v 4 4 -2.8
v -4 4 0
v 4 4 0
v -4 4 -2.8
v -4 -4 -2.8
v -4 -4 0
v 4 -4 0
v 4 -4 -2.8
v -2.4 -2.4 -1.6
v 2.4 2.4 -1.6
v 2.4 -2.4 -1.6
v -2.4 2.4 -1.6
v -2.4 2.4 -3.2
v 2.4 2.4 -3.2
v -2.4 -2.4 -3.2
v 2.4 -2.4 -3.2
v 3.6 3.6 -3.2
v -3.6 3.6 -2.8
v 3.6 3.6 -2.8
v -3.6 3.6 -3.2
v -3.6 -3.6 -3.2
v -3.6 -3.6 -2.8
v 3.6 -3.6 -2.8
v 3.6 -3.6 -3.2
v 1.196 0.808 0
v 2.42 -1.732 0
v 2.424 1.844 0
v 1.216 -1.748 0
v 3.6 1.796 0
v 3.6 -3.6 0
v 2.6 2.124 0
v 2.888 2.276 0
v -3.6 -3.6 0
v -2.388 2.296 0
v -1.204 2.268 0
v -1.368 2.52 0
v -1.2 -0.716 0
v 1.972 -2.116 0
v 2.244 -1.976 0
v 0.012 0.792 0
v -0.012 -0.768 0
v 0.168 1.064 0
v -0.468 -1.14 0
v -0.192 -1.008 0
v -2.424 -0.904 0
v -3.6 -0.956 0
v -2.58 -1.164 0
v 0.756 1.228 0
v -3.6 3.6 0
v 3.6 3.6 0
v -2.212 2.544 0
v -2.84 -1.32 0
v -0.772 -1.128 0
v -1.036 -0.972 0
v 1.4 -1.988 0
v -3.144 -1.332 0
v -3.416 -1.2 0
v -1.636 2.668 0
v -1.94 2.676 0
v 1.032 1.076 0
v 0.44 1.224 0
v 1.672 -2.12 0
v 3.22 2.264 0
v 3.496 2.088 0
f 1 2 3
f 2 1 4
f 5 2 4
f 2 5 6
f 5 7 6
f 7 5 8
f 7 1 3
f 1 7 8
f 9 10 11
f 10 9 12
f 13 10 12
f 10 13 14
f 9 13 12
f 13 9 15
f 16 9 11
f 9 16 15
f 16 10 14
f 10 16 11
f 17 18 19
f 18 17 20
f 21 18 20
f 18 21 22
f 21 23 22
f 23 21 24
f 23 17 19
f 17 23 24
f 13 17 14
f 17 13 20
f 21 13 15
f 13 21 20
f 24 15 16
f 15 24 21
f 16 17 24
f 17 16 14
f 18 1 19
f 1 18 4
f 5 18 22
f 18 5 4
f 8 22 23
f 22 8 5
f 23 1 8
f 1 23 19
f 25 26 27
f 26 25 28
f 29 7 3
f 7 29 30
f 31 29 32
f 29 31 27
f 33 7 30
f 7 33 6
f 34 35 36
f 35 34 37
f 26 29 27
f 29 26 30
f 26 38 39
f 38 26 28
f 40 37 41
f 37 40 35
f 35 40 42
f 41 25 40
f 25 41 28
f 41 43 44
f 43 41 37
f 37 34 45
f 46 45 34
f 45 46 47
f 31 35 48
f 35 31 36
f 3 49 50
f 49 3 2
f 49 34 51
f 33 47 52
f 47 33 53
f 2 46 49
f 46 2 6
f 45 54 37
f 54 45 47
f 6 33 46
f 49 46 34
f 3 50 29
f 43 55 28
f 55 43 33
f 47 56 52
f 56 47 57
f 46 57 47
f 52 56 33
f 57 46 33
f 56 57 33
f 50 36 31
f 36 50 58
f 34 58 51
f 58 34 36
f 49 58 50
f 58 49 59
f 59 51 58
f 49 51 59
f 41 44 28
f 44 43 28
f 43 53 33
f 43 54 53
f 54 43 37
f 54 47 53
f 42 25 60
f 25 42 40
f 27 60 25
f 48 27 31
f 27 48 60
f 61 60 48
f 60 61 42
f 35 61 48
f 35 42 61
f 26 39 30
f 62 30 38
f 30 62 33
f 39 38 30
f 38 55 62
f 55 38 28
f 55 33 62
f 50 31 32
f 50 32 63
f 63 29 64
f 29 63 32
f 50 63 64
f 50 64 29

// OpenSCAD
// file: ../p/box5.scad
use <../lib.scad>
function ldraw_lib__box5() = [
// 0 Box with 5 Faces and All Edges
// 0 Name: box5.dat
// 0 Author: James Jessiman
// 0 !LDRAW_ORG Primitive UPDATE 2012-01
// 0 !LICENSE Licensed under CC BY 4.0 : see CAreadme.txt
// 
// 0 BFC CERTIFY CCW
  [0,"BFC","CERTIFY"],
  [0,"BFC","CCW"],
// 
// 0 !HISTORY 2002-04-03 [sbliss] Modified for BFC compliance
// 0 !HISTORY 2002-04-25 [PTadmin] Official Update 2002-02
// 0 !HISTORY 2007-06-24 [PTadmin] Header formatted for Contributor Agreement
// 0 !HISTORY 2008-07-01 [PTadmin] Official Update 2008-01
// 0 !HISTORY 2012-02-16 [Philo] Changed to CCW
// 0 !HISTORY 2012-03-30 [PTadmin] Official Update 2012-01
// 
// 
// 2 24 1 1 1 -1 1 1
  [2,24,1,1,1,-1,1,1],
// 2 24 -1 1 1 -1 1 -1
  [2,24,-1,1,1,-1,1,-1],
// 2 24 -1 1 -1 1 1 -1
  [2,24,-1,1,-1,1,1,-1],
// 2 24 1 1 -1 1 1 1
  [2,24,1,1,-1,1,1,1],
// 2 24 1 0 1 -1 0 1
  [2,24,1,0,1,-1,0,1],
// 2 24 -1 0 1 -1 0 -1
  [2,24,-1,0,1,-1,0,-1],
// 2 24 -1 0 -1 1 0 -1
  [2,24,-1,0,-1,1,0,-1],
// 2 24 1 0 -1 1 0 1
  [2,24,1,0,-1,1,0,1],
// 2 24 1 0 1 1 1 1
  [2,24,1,0,1,1,1,1],
// 2 24 -1 0 1 -1 1 1
  [2,24,-1,0,1,-1,1,1],
// 2 24 1 0 -1 1 1 -1
  [2,24,1,0,-1,1,1,-1],
// 2 24 -1 0 -1 -1 1 -1
  [2,24,-1,0,-1,-1,1,-1],
// 4 16 -1 1 1 1 1 1 1 1 -1 -1 1 -1
  [4,16,-1,1,1,1,1,1,1,1,-1,-1,1,-1],
// 4 16 -1 1 1 -1 0 1 1 0 1 1 1 1
  [4,16,-1,1,1,-1,0,1,1,0,1,1,1,1],
// 4 16 -1 1 -1 -1 0 -1 -1 0 1 -1 1 1
  [4,16,-1,1,-1,-1,0,-1,-1,0,1,-1,1,1],
// 4 16 1 1 -1 1 0 -1 -1 0 -1 -1 1 -1
  [4,16,1,1,-1,1,0,-1,-1,0,-1,-1,1,-1],
// 4 16 1 1 1 1 0 1 1 0 -1 1 1 -1
  [4,16,1,1,1,1,0,1,1,0,-1,1,1,-1],
];
module ldraw_lib__box5(step=0, col=false, unit=2/5, alt=false, line=0.2, solid=!$preview)
    makepoly(ldraw_lib__box5(), step=step, col=col, unit=unit, alt=alt, line=line, solid=solid);
ldraw_lib__box5(line=0.2);
// file: ../p/box4.scad
use <../lib.scad>
function ldraw_lib__box4() = [
// 0 Box with 4 Faces (2 Parallel Pairs) and All Edges
// 0 Name: box4.dat
// 0 Author: James Jessiman
// 0 !LDRAW_ORG Primitive UPDATE 2012-01
// 0 !LICENSE Licensed under CC BY 4.0 : see CAreadme.txt
// 
// 0 BFC CERTIFY CCW
  [0,"BFC","CERTIFY"],
  [0,"BFC","CCW"],
// 
// 0 !HISTORY 2002-04-03 [sbliss] Modified for BFC compliance
// 0 !HISTORY 2002-04-25 [PTadmin] Official Update 2002-02
// 0 !HISTORY 2007-06-24 [PTadmin] Header formatted for Contributor Agreement
// 0 !HISTORY 2008-07-01 [PTadmin] Official Update 2008-01
// 0 !HISTORY 2012-02-16 [Philo] Changed to CCW
// 0 !HISTORY 2012-03-30 [PTadmin] Official Update 2012-01
// 
// 
// 2 24 1 1 1 -1 1 1
  [2,24,1,1,1,-1,1,1],
// 2 24 -1 1 1 -1 1 -1
  [2,24,-1,1,1,-1,1,-1],
// 2 24 -1 1 -1 1 1 -1
  [2,24,-1,1,-1,1,1,-1],
// 2 24 1 1 -1 1 1 1
  [2,24,1,1,-1,1,1,1],
// 2 24 1 0 1 -1 0 1
  [2,24,1,0,1,-1,0,1],
// 2 24 -1 0 1 -1 0 -1
  [2,24,-1,0,1,-1,0,-1],
// 2 24 -1 0 -1 1 0 -1
  [2,24,-1,0,-1,1,0,-1],
// 2 24 1 0 -1 1 0 1
  [2,24,1,0,-1,1,0,1],
// 2 24 1 0 1 1 1 1
  [2,24,1,0,1,1,1,1],
// 2 24 -1 0 1 -1 1 1
  [2,24,-1,0,1,-1,1,1],
// 2 24 1 0 -1 1 1 -1
  [2,24,1,0,-1,1,1,-1],
// 2 24 -1 0 -1 -1 1 -1
  [2,24,-1,0,-1,-1,1,-1],
// 4 16 -1 1 1 -1 0 1 1 0 1 1 1 1
  [4,16,-1,1,1,-1,0,1,1,0,1,1,1,1],
// 4 16 -1 1 -1 -1 0 -1 -1 0 1 -1 1 1
  [4,16,-1,1,-1,-1,0,-1,-1,0,1,-1,1,1],
// 4 16 1 1 -1 1 0 -1 -1 0 -1 -1 1 -1
  [4,16,1,1,-1,1,0,-1,-1,0,-1,-1,1,-1],
// 4 16 1 1 1 1 0 1 1 0 -1 1 1 -1
  [4,16,1,1,1,1,0,1,1,0,-1,1,1,-1],
];
module ldraw_lib__box4(step=0, col=false, unit=2/5, alt=false, line=0.2, solid=!$preview)
    makepoly(ldraw_lib__box4(), step=step, col=col, unit=unit, alt=alt, line=line, solid=solid);
ldraw_lib__box4(line=0.2);
// file: s/3070bs01.scad
use <../../lib.scad>
use <../../p/box4.scad>
use <../../p/box5.scad>
function ldraw_lib__s__3070bs01() = [
// 0 ~Tile  1 x  1 with Groove without Top Face
// 0 Name: s\3070bs01.dat
// 0 Author: Chris Dee [cwdee]
// 0 !LDRAW_ORG Subpart UPDATE 2009-02
// 0 !LICENSE Licensed under CC BY 4.0 : see CAreadme.txt
// 
// 0 BFC CERTIFY CCW
  [0,"BFC","CERTIFY"],
  [0,"BFC","CCW"],
// 
// 0 !HISTORY 2009-09-03 [PTadmin] Official Update 2009-02
// 
// 
// 1 16 0 0 0 10 0 0 0 7 0 0 0 10 box4.dat
  [1,16,0,0,0,10,0,0,0,7,0,0,0,10, ldraw_lib__box4()],
// 0 BFC INVERTNEXT
  [0,"BFC","INVERTNEXT"],
// 1 16 0 8 0 6 0 0 0 -4 0 0 0 6 box5.dat
  [1,16,0,8,0,6,0,0,0,-4,0,0,0,6, ldraw_lib__box5()],
// 1 16 0 7 0 9 0 0 0 1 0 0 0 9 box4.dat
  [1,16,0,7,0,9,0,0,0,1,0,0,0,9, ldraw_lib__box4()],
// 
// 4 16 9 8 9 6 8 6 -6 8 6 -9 8 9
  [4,16,9,8,9,6,8,6,-6,8,6,-9,8,9],
// 4 16 -9 8 9 -6 8 6 -6 8 -6 -9 8 -9
  [4,16,-9,8,9,-6,8,6,-6,8,-6,-9,8,-9],
// 4 16 -9 8 -9 -6 8 -6 6 8 -6 9 8 -9
  [4,16,-9,8,-9,-6,8,-6,6,8,-6,9,8,-9],
// 4 16 9 8 -9 6 8 -6 6 8 6 9 8 9
  [4,16,9,8,-9,6,8,-6,6,8,6,9,8,9],
// 
// 4 16 10 7 10 9 7 9 -9 7 9 -10 7 10
  [4,16,10,7,10,9,7,9,-9,7,9,-10,7,10],
// 4 16 -10 7 10 -9 7 9 -9 7 -9 -10 7 -10
  [4,16,-10,7,10,-9,7,9,-9,7,-9,-10,7,-10],
// 4 16 -10 7 -10 -9 7 -9 9 7 -9 10 7 -10
  [4,16,-10,7,-10,-9,7,-9,9,7,-9,10,7,-10],
// 4 16 10 7 -10 9 7 -9 9 7 9 10 7 10
  [4,16,10,7,-10,9,7,-9,9,7,9,10,7,10],
// 0
];
module ldraw_lib__s__3070bs01(step=0, col=false, unit=2/5, alt=false, line=0.2, solid=!$preview)
    makepoly(ldraw_lib__s__3070bs01(), step=step, col=col, unit=unit, alt=alt, line=line, solid=solid);
ldraw_lib__s__3070bs01(line=0.2);
// main file
use <../lib.scad>
use <s/3070bs01.scad>
function ldraw_lib__3070bp0u() = [
// 0 Tile  1 x  1 with Blue and Bright Pink Streaks Pattern
// 0 Name: 3070bp0u.dat
// 0 Author: Philippe Hurbain [Philo]
// 0 !LDRAW_ORG Part UPDATE 2020-03
// 0 !LICENSE Licensed under CC BY 4.0 : see CAreadme.txt
// 
// 0 BFC CERTIFY CCW
  [0,"BFC","CERTIFY"],
  [0,"BFC","CCW"],
// 
// 0 !KEYWORDS BrickLink 3070pb145, Dots, Rebrickable 3070bpr0012, Set 41916
// 
// 0 !HISTORY 2020-12-29 [PTadmin] Official Update 2020-03
// 
// 
// 1 16 0 0 0 1 0 0 0 1 0 0 0 1 s\3070bs01.dat
  [1,16,0,0,0,1,0,0,0,1,0,0,0,1, ldraw_lib__s__3070bs01()],
// 4 29 2.99 0 2.02 3.04 0 -4.37 6.05 0 -4.33 6.06 0 4.61
  [4,29,2.99,0,2.02,3.04,0,-4.37,6.05,0,-4.33,6.06,0,4.61],
// 4 16 10 0 -10 10 0 10 9 0 4.49 9 0 -9
  [4,16,10,0,-10,10,0,10,9,0,4.49,9,0,-9],
// 4 1 7.22 0 5.69 6.5 0 5.31 6.06 0 4.61 9 0 4.49
  [4,1,7.22,0,5.69,6.5,0,5.31,6.06,0,4.61,9,0,4.49],
// 4 16 -9 0 -9 -10 0 -10 10 0 -10 9 0 -9
  [4,16,-9,0,-9,-10,0,-10,10,0,-10,9,0,-9],
// 4 1 -3.01 0 5.67 -3.42 0 6.3 -5.97 0 5.74 -3 0 -1.79
  [4,1,-3.01,0,5.67,-3.42,0,6.3,-5.97,0,5.74,-3,0,-1.79],
// 4 1 9 0 4.49 6.06 0 4.61 6.05 0 -4.33 9 0 -9
  [4,1,9,0,4.49,6.06,0,4.61,6.05,0,-4.33,9,0,-9],
// 4 29 4.93 0 -5.29 5.61 0 -4.94 6.05 0 -4.33 3.04 0 -4.37
  [4,29,4.93,0,-5.29,5.61,0,-4.94,6.05,0,-4.33,3.04,0,-4.37],
// 4 29 -3 0 -1.79 -0.03 0 -1.92 0.03 0 1.98 -3.01 0 5.67
  [4,29,-3,0,-1.79,-0.03,0,-1.92,0.03,0,1.98,-3.01,0,5.67],
// 3 29 -3.01 0 5.67 0.03 0 1.98 0.42 0 2.66
  [3,29,-3.01,0,5.67,0.03,0,1.98,0.42,0,2.66],
// 4 1 -0.03 0 -1.92 3.04 0 -4.37 2.99 0 2.02 0.03 0 1.98
  [4,1,-0.03,0,-1.92,3.04,0,-4.37,2.99,0,2.02,0.03,0,1.98],
// 4 29 -1.17 0 -2.85 -0.48 0 -2.52 -0.03 0 -1.92 -3 0 -1.79
  [4,29,-1.17,0,-2.85,-0.48,0,-2.52,-0.03,0,-1.92,-3,0,-1.79],
// 3 1 -3 0 -1.79 -5.97 0 5.74 -6.06 0 -2.26
  [3,1,-3,0,-1.79,-5.97,0,5.74,-6.06,0,-2.26],
// 4 29 -6.06 0 -2.26 -5.97 0 5.74 -9 0 -2.39 -6.45 0 -2.91
  [4,29,-6.06,0,-2.26,-5.97,0,5.74,-9,0,-2.39,-6.45,0,-2.91],
// 4 29 -3.01 0 5.67 1.89 0 3.07 6.5 0 5.31 -3.42 0 6.3
  [4,29,-3.01,0,5.67,1.89,0,3.07,6.5,0,5.31,-3.42,0,6.3],
// 4 16 -9 0 9 9 0 9 10 0 10 -10 0 10
  [4,16,-9,0,9,9,0,9,10,0,10,-10,0,10],
// 3 29 -9 0 9 -5.97 0 5.74 -5.53 0 6.36
  [3,29,-9,0,9,-5.97,0,5.74,-5.53,0,6.36],
// 4 1 -9 0 -9 -1.93 0 -2.82 -6.45 0 -2.91 -7.1 0 -3.3
  [4,1,-9,0,-9,-1.93,0,-2.82,-6.45,0,-2.91,-7.1,0,-3.3],
// 4 16 -9 0 -2.39 -9 0 9 -10 0 10 -10 0 -10
  [4,16,-9,0,-2.39,-9,0,9,-10,0,10,-10,0,-10],
// 4 1 -6.06 0 -2.26 -6.45 0 -2.91 -2.59 0 -2.43 -3 0 -1.79
  [4,1,-6.06,0,-2.26,-6.45,0,-2.91,-2.59,0,-2.43,-3,0,-1.79],
// 3 16 -10 0 -10 -9 0 -9 -9 0 -2.39
  [3,16,-10,0,-10,-9,0,-9,-9,0,-2.39],
// 3 29 -9 0 9 -9 0 -2.39 -5.97 0 5.74
  [3,29,-9,0,9,-9,0,-2.39,-5.97,0,5.74],
// 3 16 10 0 10 9 0 9 9 0 4.49
  [3,16,10,0,10,9,0,9,9,0,4.49],
// 4 1 -1.17 0 -2.85 -9 0 -9 3.5 0 -4.97 3.04 0 -4.37
  [4,1,-1.17,0,-2.85,-9,0,-9,3.5,0,-4.97,3.04,0,-4.37],
// 4 29 -7.86 0 -3.33 -7.1 0 -3.3 -6.45 0 -2.91 -8.54 0 -3
  [4,29,-7.86,0,-3.33,-7.1,0,-3.3,-6.45,0,-2.91,-8.54,0,-3],
// 3 29 -9 0 -2.39 -8.54 0 -3 -6.45 0 -2.91
  [3,29,-9,0,-2.39,-8.54,0,-3,-6.45,0,-2.91],
// 3 1 -7.1 0 -3.3 -7.86 0 -3.33 -9 0 -9
  [3,1,-7.1,0,-3.3,-7.86,0,-3.33,-9,0,-9],
// 3 1 -8.54 0 -3 -9 0 -2.39 -9 0 -9
  [3,1,-8.54,0,-3,-9,0,-2.39,-9,0,-9],
// 3 1 -7.86 0 -3.33 -8.54 0 -3 -9 0 -9
  [3,1,-7.86,0,-3.33,-8.54,0,-3,-9,0,-9],
// 4 29 -3.42 0 6.3 6.5 0 5.31 9 0 9 -4.09 0 6.67
  [4,29,-3.42,0,6.3,6.5,0,5.31,9,0,9,-4.09,0,6.67],
// 4 1 -5.53 0 6.36 -5.97 0 5.74 -3.42 0 6.3 -4.09 0 6.67
  [4,1,-5.53,0,6.36,-5.97,0,5.74,-3.42,0,6.3,-4.09,0,6.67],
// 4 29 -4.09 0 6.67 9 0 9 -9 0 9 -4.85 0 6.69
  [4,29,-4.09,0,6.67,9,0,9,-9,0,9,-4.85,0,6.69],
// 3 1 -4.85 0 6.69 -5.53 0 6.36 -4.09 0 6.67
  [3,1,-4.85,0,6.69,-5.53,0,6.36,-4.09,0,6.67],
// 3 29 -9 0 9 -5.53 0 6.36 -4.85 0 6.69
  [3,29,-9,0,9,-5.53,0,6.36,-4.85,0,6.69],
// 3 1 -0.03 0 -1.92 -0.48 0 -2.52 3.04 0 -4.37
  [3,1,-0.03,0,-1.92,-0.48,0,-2.52,3.04,0,-4.37],
// 3 1 -0.48 0 -2.52 -1.17 0 -2.85 3.04 0 -4.37
  [3,1,-0.48,0,-2.52,-1.17,0,-2.85,3.04,0,-4.37],
// 3 1 -1.17 0 -2.85 -1.93 0 -2.82 -9 0 -9
  [3,1,-1.17,0,-2.85,-1.93,0,-2.82,-9,0,-9],
// 4 29 -1.93 0 -2.82 -1.17 0 -2.85 -3 0 -1.79 -2.59 0 -2.43
  [4,29,-1.93,0,-2.82,-1.17,0,-2.85,-3,0,-1.79,-2.59,0,-2.43],
// 3 1 -2.59 0 -2.43 -6.45 0 -2.91 -1.93 0 -2.82
  [3,1,-2.59,0,-2.43,-6.45,0,-2.91,-1.93,0,-2.82],
// 4 1 0.03 0 1.98 2.99 0 2.02 2.58 0 2.69 0.42 0 2.66
  [4,1,0.03,0,1.98,2.99,0,2.02,2.58,0,2.69,0.42,0,2.66],
// 3 29 6.06 0 4.61 2.58 0 2.69 2.99 0 2.02
  [3,29,6.06,0,4.61,2.58,0,2.69,2.99,0,2.02],
// 4 29 1.89 0 3.07 2.58 0 2.69 6.06 0 4.61 6.5 0 5.31
  [4,29,1.89,0,3.07,2.58,0,2.69,6.06,0,4.61,6.5,0,5.31],
// 4 1 2.58 0 2.69 1.89 0 3.07 1.1 0 3.06 0.42 0 2.66
  [4,1,2.58,0,2.69,1.89,0,3.07,1.1,0,3.06,0.42,0,2.66],
// 3 29 -3.01 0 5.67 1.1 0 3.06 1.89 0 3.07
  [3,29,-3.01,0,5.67,1.1,0,3.06,1.89,0,3.07],
// 3 29 -3.01 0 5.67 0.42 0 2.66 1.1 0 3.06
  [3,29,-3.01,0,5.67,0.42,0,2.66,1.1,0,3.06],
// 3 1 6.05 0 -4.33 5.61 0 -4.94 9 0 -9
  [3,1,6.05,0,-4.33,5.61,0,-4.94,9,0,-9],
// 4 1 4.18 0 -5.3 -9 0 -9 9 0 -9 4.93 0 -5.29
  [4,1,4.18,0,-5.3,-9,0,-9,9,0,-9,4.93,0,-5.29],
// 3 1 5.61 0 -4.94 4.93 0 -5.29 9 0 -9
  [3,1,5.61,0,-4.94,4.93,0,-5.29,9,0,-9],
// 4 29 4.18 0 -5.3 4.93 0 -5.29 3.04 0 -4.37 3.5 0 -4.97
  [4,29,4.18,0,-5.3,4.93,0,-5.29,3.04,0,-4.37,3.5,0,-4.97],
// 3 1 3.5 0 -4.97 -9 0 -9 4.18 0 -5.3
  [3,1,3.5,0,-4.97,-9,0,-9,4.18,0,-5.3],
// 3 29 9 0 9 6.5 0 5.31 7.22 0 5.69
  [3,29,9,0,9,6.5,0,5.31,7.22,0,5.69],
// 3 29 9 0 9 7.22 0 5.69 8.05 0 5.66
  [3,29,9,0,9,7.22,0,5.69,8.05,0,5.66],
// 4 1 8.05 0 5.66 7.22 0 5.69 9 0 4.49 8.74 0 5.22
  [4,1,8.05,0,5.66,7.22,0,5.69,9,0,4.49,8.74,0,5.22],
// 3 29 9 0 9 8.05 0 5.66 8.74 0 5.22
  [3,29,9,0,9,8.05,0,5.66,8.74,0,5.22],
// 3 29 9 0 9 8.74 0 5.22 9 0 4.49
  [3,29,9,0,9,8.74,0,5.22,9,0,4.49],
];
module ldraw_lib__3070bp0u(step=0, col=false, unit=2/5, alt=false, line=0.2, solid=!$preview)
    makepoly(ldraw_lib__3070bp0u(), step=step, col=col, unit=unit, alt=alt, line=line, solid=solid);
ldraw_lib__3070bp0u(line=0.2);
